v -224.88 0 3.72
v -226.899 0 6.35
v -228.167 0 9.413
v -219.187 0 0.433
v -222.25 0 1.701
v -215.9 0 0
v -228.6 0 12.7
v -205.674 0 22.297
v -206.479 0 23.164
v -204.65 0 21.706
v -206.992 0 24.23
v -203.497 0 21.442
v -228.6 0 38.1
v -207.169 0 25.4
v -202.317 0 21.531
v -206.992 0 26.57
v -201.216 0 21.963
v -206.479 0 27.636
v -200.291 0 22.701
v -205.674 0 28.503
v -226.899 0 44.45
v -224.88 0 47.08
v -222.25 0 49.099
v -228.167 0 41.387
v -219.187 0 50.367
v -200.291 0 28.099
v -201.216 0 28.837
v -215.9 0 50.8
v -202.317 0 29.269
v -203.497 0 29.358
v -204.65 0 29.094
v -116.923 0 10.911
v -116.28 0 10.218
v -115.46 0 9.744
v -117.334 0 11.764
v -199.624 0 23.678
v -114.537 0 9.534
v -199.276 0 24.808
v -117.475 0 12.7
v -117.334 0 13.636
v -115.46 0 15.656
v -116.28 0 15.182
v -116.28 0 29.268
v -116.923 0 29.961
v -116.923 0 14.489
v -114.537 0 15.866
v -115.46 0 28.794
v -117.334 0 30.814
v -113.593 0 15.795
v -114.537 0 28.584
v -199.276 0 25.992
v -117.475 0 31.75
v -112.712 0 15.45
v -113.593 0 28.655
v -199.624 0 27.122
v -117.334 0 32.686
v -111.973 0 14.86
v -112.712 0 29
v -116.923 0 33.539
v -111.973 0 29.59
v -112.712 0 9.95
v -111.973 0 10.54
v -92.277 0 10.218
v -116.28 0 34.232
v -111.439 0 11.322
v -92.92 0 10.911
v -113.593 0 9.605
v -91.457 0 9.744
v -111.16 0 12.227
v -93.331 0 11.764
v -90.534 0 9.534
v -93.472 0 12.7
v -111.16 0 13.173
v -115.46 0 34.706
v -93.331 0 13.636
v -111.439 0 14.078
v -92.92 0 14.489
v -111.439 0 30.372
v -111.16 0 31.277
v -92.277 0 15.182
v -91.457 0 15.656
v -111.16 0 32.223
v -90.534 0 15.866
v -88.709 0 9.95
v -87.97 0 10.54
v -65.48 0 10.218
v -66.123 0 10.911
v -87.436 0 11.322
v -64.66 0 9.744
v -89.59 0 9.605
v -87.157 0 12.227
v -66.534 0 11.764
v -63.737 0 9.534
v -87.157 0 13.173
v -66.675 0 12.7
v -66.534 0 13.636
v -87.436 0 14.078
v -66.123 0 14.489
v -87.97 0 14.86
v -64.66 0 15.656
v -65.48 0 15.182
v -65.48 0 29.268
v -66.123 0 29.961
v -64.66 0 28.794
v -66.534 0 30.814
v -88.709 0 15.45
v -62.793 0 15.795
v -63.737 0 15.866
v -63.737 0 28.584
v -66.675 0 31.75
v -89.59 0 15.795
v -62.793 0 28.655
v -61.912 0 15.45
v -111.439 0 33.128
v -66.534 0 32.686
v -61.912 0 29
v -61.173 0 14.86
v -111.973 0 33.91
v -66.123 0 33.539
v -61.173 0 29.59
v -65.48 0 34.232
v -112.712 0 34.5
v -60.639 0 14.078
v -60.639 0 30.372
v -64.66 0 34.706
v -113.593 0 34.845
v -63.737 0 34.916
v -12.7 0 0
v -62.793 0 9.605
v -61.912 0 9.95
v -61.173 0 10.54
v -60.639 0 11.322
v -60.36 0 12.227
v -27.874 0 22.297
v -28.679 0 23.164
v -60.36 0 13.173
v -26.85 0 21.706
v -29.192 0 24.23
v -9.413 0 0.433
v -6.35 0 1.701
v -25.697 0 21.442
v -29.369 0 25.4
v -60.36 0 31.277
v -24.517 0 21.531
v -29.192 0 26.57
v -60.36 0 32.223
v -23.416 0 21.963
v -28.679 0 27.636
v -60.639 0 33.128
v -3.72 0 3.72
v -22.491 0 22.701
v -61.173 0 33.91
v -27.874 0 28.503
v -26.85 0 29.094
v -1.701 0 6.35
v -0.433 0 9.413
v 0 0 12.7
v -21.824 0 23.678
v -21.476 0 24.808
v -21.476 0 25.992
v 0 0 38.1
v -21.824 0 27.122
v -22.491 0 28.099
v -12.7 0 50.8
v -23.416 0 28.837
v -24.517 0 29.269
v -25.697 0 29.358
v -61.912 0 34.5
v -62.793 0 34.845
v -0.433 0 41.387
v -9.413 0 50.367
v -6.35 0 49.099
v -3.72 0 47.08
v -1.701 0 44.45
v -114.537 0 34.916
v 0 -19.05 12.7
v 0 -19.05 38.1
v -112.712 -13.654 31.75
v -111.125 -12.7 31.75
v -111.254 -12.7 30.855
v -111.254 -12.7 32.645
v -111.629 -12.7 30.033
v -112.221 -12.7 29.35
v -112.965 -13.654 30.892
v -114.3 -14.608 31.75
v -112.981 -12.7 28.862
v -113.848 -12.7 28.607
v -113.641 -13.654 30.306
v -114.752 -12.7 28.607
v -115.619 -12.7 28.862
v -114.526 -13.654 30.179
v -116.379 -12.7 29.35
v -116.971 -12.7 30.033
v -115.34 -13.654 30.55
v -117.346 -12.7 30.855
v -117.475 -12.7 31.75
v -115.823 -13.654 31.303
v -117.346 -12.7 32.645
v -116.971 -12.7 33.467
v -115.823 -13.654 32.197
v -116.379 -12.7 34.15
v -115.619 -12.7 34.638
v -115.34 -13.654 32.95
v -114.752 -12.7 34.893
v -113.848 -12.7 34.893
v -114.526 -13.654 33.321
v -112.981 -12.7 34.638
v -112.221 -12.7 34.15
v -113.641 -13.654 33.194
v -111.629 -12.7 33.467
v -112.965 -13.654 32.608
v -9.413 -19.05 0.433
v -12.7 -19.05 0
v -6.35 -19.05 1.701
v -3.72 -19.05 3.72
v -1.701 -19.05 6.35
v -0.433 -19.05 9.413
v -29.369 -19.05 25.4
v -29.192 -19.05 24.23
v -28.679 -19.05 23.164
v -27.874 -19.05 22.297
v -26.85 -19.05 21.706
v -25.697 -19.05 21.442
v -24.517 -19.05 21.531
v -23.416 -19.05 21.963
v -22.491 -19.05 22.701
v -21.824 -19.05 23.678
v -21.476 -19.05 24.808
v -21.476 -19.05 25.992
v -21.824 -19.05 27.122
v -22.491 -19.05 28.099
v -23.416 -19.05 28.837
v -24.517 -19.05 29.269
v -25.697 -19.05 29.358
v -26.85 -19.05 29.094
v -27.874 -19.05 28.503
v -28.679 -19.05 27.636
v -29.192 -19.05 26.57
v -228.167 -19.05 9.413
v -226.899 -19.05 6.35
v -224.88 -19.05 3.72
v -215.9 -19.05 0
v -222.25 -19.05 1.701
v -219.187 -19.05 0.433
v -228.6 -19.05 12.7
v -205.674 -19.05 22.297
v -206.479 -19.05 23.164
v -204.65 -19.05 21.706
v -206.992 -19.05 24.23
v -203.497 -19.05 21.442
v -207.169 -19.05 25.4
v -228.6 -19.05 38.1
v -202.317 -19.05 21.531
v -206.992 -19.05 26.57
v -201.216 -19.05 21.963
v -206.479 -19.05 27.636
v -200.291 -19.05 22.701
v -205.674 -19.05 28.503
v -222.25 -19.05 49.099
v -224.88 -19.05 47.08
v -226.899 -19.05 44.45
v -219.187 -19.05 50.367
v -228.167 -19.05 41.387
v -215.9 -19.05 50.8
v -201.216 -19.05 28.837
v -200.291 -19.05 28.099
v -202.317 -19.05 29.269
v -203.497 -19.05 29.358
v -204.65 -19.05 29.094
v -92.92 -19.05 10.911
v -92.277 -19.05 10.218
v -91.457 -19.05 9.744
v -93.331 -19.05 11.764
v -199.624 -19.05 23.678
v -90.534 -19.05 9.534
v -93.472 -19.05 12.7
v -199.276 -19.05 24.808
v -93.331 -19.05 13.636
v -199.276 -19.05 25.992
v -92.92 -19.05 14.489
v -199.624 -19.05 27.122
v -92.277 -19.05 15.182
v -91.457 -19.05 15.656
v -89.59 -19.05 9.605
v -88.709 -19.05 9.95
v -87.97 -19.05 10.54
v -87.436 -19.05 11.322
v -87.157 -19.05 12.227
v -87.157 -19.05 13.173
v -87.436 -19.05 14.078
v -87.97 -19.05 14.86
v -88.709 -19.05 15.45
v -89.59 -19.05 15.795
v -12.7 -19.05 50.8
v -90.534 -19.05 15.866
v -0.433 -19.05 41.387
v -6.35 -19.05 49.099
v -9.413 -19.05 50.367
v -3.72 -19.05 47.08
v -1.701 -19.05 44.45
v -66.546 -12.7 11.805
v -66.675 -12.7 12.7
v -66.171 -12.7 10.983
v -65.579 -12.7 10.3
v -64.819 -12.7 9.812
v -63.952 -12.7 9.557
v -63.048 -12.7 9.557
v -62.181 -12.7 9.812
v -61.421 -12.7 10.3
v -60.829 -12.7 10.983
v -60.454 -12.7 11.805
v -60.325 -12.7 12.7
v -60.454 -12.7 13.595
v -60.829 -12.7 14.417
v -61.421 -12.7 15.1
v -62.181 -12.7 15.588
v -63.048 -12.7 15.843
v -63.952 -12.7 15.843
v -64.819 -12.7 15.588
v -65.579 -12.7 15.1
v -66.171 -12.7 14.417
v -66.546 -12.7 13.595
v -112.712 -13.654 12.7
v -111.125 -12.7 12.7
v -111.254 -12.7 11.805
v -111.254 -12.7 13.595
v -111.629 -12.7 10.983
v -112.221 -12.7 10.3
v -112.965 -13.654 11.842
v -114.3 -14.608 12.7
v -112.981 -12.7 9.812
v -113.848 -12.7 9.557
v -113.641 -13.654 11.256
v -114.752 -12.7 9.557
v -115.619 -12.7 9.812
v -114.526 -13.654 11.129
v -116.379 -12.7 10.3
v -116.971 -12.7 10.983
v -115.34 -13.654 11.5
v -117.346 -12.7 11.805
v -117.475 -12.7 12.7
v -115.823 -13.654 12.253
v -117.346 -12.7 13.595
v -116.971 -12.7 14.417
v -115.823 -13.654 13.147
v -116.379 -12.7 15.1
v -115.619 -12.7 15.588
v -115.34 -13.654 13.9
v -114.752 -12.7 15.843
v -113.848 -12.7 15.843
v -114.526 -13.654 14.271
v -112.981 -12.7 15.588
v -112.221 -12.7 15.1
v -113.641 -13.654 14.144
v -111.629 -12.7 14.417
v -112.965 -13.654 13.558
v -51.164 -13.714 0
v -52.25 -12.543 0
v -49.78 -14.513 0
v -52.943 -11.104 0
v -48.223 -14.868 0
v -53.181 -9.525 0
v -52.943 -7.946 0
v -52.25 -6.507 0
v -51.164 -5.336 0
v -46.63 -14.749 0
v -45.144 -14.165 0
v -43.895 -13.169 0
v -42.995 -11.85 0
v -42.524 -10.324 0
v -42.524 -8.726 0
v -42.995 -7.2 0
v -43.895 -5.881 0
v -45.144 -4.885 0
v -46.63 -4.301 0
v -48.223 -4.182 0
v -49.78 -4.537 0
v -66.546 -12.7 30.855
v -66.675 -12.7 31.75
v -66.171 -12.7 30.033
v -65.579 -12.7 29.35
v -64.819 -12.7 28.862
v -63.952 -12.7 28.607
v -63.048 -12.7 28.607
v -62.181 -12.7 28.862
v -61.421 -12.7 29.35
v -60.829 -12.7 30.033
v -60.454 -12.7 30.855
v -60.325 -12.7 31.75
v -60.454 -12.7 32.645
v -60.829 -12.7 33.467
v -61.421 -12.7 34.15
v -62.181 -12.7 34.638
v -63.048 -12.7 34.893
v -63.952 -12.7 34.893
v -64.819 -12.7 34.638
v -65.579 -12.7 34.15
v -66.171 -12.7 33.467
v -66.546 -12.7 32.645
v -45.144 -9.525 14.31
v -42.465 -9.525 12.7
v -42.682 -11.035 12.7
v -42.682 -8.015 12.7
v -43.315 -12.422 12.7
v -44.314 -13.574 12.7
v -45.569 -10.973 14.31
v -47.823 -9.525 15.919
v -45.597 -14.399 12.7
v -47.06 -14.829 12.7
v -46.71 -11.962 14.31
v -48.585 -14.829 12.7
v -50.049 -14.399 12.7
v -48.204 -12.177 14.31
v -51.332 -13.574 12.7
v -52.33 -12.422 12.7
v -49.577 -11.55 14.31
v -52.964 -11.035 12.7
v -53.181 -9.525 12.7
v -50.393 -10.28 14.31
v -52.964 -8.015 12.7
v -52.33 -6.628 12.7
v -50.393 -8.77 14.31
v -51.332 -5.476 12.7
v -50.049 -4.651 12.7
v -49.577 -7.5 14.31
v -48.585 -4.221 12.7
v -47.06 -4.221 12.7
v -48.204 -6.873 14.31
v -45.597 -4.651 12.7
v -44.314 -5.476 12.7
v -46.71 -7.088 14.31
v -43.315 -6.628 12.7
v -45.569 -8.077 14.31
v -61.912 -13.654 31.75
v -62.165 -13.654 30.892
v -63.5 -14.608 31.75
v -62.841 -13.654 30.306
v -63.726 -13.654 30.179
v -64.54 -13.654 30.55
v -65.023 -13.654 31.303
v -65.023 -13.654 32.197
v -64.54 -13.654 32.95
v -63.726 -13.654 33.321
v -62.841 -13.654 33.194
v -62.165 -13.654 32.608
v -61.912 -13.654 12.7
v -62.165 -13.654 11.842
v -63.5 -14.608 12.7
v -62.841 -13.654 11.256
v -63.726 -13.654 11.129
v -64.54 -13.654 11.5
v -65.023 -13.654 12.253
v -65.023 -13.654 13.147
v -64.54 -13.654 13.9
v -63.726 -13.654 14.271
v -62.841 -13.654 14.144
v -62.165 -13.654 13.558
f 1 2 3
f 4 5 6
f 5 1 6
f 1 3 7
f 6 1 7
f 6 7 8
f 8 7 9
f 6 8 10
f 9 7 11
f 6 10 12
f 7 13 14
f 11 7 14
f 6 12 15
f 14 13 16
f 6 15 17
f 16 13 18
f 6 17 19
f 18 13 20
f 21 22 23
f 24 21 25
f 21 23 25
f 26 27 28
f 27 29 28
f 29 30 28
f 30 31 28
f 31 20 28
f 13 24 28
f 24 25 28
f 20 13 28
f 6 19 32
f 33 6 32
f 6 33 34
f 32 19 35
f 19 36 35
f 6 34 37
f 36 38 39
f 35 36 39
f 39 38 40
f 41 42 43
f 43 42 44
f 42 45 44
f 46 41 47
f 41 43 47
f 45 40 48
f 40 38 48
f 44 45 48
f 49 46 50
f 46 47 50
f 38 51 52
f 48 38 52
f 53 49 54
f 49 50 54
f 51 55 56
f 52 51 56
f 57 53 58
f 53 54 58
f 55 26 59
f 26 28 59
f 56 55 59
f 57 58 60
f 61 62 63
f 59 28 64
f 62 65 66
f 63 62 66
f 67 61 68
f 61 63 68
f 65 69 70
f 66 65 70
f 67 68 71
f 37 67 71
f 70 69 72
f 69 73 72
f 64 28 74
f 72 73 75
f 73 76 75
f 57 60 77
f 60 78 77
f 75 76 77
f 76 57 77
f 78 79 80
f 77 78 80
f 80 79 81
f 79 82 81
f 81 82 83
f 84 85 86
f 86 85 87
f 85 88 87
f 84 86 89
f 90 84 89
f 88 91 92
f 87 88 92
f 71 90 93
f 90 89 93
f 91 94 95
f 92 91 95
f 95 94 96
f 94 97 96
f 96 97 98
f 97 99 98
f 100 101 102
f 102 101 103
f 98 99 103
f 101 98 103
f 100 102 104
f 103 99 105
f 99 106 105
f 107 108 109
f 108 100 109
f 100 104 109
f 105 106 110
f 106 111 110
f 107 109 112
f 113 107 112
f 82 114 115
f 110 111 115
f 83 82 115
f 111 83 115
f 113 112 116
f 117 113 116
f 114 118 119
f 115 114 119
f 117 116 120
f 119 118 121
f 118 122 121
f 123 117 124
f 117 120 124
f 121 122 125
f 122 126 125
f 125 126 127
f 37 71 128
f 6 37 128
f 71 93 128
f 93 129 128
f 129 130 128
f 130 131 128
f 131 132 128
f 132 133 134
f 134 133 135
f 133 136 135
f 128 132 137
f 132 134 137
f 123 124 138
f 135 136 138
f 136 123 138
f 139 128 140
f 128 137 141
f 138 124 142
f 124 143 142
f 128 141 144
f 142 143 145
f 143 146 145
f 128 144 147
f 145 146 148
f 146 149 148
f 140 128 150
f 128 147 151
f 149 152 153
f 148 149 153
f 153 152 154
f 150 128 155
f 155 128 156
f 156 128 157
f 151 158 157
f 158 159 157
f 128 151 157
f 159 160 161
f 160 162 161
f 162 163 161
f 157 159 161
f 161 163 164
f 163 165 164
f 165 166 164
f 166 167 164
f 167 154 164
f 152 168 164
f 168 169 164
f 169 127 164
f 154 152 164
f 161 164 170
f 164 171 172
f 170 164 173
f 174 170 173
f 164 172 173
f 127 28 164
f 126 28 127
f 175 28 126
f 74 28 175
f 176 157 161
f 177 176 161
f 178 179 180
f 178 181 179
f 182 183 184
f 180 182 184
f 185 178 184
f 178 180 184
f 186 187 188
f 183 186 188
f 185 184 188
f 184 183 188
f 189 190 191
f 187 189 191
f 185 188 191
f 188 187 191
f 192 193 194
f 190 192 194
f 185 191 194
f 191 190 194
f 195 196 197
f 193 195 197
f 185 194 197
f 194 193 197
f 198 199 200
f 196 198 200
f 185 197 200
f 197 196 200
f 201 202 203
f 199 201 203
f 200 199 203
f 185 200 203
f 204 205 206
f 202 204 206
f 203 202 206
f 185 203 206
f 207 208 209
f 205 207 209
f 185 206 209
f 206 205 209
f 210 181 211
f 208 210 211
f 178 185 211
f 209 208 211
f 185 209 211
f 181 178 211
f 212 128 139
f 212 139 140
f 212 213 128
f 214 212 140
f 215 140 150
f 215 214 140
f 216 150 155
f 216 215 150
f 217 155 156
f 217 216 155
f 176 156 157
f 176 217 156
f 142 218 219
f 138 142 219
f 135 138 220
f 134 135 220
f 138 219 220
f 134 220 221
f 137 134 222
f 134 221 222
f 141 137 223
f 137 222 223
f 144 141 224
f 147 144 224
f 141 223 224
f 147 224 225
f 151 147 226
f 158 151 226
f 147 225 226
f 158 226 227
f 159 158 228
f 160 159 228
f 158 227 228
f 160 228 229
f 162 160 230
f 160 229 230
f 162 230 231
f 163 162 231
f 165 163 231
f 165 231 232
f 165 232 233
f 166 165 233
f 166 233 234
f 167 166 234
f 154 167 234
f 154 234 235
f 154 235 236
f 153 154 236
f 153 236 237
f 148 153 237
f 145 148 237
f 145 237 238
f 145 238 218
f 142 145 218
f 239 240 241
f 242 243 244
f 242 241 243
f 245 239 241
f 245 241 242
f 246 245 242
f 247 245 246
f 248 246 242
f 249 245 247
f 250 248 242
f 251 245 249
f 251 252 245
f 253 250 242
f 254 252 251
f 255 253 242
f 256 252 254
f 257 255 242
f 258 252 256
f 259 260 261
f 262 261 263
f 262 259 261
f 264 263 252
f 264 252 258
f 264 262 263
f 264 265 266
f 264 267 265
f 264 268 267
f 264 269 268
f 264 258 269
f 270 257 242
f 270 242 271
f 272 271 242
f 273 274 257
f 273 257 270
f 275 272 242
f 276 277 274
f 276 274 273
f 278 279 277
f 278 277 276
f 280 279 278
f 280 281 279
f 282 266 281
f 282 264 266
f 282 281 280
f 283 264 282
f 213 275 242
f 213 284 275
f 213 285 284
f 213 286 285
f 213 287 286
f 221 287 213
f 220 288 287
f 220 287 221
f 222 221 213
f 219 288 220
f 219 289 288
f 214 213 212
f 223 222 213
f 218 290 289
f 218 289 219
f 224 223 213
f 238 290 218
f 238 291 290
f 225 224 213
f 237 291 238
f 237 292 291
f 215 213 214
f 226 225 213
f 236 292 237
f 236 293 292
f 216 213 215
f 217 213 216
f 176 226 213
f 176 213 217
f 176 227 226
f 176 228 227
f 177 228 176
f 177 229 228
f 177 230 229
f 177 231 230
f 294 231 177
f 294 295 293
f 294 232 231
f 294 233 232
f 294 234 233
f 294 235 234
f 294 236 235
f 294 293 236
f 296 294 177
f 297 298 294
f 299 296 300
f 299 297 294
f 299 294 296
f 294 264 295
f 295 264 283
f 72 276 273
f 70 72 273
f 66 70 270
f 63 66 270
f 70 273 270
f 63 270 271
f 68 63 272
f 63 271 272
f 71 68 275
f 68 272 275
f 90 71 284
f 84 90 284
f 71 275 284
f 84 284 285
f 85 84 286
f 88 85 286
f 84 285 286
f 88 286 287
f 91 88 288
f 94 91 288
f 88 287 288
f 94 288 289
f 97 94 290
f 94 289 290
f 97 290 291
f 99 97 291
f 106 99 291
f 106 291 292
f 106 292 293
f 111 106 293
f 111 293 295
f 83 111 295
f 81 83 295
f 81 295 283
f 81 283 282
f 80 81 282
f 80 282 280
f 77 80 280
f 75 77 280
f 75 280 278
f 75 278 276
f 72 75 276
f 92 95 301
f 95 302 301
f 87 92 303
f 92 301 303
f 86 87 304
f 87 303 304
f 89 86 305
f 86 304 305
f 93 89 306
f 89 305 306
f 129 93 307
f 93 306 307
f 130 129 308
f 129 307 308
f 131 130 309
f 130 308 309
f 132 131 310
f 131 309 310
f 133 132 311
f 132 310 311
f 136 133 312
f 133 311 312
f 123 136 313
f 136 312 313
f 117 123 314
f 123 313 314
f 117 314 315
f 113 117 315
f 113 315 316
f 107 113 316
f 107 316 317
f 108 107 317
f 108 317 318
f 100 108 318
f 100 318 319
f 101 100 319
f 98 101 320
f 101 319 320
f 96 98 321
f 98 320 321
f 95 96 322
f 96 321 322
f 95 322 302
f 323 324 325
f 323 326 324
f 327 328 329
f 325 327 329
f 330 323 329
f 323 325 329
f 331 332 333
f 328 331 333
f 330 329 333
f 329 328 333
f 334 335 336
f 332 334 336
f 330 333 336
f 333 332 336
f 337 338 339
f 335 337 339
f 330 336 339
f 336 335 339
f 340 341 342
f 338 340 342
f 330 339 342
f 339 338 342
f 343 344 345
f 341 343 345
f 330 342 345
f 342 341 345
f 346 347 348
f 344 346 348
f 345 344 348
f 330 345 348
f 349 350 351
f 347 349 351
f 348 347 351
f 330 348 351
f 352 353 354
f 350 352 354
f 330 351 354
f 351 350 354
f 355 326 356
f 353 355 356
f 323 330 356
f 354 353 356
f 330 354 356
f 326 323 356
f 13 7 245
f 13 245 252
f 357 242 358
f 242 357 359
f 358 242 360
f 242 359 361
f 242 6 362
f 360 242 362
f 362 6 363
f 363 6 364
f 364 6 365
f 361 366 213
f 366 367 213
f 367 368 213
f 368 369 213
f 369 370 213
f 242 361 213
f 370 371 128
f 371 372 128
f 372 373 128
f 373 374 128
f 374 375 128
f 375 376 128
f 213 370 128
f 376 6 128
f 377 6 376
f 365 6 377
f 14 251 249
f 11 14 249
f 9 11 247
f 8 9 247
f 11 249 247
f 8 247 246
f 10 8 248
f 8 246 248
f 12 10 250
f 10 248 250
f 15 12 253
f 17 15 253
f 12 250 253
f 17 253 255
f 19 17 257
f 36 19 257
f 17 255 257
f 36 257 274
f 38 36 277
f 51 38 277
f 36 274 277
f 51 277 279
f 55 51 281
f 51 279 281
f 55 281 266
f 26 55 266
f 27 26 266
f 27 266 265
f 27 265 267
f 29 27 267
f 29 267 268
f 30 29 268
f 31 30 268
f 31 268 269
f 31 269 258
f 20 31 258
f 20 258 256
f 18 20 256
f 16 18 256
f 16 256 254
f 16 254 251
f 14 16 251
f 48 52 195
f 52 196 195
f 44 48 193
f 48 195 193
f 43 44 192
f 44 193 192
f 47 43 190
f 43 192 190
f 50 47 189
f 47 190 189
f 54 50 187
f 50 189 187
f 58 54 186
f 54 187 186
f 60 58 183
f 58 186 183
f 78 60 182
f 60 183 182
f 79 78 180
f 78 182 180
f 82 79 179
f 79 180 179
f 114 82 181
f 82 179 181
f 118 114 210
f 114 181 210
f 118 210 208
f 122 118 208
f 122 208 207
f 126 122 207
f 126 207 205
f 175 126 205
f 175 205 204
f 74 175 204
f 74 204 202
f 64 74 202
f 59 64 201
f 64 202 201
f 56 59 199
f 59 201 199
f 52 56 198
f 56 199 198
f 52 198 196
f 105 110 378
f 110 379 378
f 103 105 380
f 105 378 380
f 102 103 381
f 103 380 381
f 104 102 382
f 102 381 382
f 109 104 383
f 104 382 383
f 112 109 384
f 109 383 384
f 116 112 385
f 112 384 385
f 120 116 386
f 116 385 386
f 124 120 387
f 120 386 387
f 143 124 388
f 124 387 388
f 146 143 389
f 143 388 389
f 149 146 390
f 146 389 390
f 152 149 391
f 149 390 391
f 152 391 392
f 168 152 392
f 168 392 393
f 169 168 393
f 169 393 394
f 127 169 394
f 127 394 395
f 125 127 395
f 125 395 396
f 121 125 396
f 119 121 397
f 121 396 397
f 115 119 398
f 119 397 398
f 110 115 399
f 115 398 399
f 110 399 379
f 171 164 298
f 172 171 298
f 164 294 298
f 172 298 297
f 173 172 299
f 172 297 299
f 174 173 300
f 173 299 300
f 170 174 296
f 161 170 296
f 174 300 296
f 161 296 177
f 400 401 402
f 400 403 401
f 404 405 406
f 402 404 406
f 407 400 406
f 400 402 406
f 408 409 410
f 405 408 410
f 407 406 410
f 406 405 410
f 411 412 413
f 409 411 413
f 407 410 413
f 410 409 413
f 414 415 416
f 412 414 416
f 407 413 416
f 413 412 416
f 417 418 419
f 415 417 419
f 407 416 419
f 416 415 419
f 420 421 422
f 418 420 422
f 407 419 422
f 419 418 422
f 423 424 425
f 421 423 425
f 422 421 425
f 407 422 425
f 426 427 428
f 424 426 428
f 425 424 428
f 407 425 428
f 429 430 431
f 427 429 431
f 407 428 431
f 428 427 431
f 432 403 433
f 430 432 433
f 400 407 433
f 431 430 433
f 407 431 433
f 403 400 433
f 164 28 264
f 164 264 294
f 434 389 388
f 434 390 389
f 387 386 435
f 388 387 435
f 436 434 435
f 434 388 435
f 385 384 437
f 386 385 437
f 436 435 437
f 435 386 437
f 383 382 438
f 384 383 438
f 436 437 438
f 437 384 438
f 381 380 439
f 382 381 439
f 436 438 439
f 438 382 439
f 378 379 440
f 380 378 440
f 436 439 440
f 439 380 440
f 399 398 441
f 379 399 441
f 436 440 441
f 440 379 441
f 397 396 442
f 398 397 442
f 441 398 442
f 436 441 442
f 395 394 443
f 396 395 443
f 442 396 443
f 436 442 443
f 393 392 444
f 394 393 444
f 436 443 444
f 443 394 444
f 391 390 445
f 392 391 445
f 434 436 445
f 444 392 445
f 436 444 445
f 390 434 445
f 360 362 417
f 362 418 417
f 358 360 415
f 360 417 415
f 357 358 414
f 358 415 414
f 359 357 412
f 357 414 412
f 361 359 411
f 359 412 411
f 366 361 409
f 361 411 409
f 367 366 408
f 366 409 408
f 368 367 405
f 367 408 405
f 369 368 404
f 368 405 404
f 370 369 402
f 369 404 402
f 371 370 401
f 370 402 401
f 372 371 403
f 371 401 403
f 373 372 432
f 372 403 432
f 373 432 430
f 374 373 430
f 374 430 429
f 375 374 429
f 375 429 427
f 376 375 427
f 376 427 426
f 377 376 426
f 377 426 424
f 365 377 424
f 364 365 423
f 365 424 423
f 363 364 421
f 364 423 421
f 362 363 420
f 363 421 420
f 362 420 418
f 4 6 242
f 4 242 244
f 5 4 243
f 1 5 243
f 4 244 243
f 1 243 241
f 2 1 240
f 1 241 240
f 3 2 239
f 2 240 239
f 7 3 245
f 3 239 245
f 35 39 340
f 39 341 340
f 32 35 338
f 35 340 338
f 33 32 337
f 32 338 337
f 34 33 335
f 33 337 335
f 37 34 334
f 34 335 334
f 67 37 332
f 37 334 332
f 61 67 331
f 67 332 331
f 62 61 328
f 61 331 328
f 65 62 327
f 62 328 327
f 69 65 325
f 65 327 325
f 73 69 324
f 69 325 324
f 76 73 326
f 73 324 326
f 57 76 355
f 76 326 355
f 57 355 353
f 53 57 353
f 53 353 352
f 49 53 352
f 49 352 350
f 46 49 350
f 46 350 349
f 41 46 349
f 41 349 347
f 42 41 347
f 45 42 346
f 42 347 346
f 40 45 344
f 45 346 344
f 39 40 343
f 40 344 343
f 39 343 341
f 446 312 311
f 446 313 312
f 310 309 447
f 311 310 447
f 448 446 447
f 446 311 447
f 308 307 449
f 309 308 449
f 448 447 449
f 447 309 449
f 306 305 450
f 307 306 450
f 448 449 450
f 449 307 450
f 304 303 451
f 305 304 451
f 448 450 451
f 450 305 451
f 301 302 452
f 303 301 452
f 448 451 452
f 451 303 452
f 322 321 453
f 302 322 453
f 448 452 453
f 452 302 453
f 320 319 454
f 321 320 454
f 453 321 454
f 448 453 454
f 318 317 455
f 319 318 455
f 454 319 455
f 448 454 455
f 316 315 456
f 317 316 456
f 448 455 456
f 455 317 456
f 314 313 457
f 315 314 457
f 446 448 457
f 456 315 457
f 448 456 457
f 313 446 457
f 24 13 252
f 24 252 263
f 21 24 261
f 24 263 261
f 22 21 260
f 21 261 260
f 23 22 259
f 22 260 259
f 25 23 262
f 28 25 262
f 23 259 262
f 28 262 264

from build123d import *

# Parameters (mm, degrees)
F0_W      = 228.6
F0_H      = 50.8
F1_DEPTH  = 19.05
F2_D      = 7.9375
F3_R      = 12.7
F4_D      = 6.35
F4_DEPTH  = 12.7
F4_TIP    = 1.9077324654
F9_D      = 6.35
F10_R     = 12.7
F12_D     = 10.71626
F12_DEPTH = 12.7
F12_TIP   = 3.2194893086


with BuildPart() as f1:
    # F0 (on Front) → F1 (new body)
    with BuildSketch(Plane.XZ):
        with Locations((-114.3, 25.4)):
            Rectangle(F0_W, F0_H)
    extrude(amount=F1_DEPTH)

    # F2 (through all)
    with Locations(Plane(origin=(0, 0, 0), x_dir=(1, 0, 0), z_dir=(0, 1, 0))):
        with Locations((-203.2, -25.4), (-25.4, -25.4)):
            Hole(F2_D / 2)

    # F3
    f3_edges = [f1.edges().sort_by_distance(p)[0] for p in [
        (0, -9.525, 0),
        (0, -9.525, 50.8),
    ]]
    fillet(f3_edges, radius=F3_R)

    # F4
    with Locations(Plane(origin=(0, 0, 0), x_dir=(1, 0, 0), z_dir=(0, 1, 0))):
        with Locations((-114.3, -31.75), (-114.3, -12.7), (-63.5, -12.7), (-63.5, -31.75)):
            Hole(F4_D / 2, depth=F4_DEPTH)
            with Locations((0, 0, -(F4_DEPTH + F4_TIP / 2))):  # 118° drill point
                Cone(0, F4_D / 2, F4_TIP, mode=Mode.SUBTRACT)


with BuildPart() as f5_1:
    # F5: instance of F1
    add(f1.part.mirror(Plane(origin=(-114.9742152146, -19.05, 25.4), x_dir=(1, 0, 0), z_dir=(0, -1, 0))))


with BuildPart() as f7_1:
    # F7: instance of F5_1
    add(f5_1.part.mirror(Plane(origin=(-114.9742152146, -19.05, 25.4), x_dir=(-1, 0, 0), z_dir=(0, 1, 0))))

    # F9 (through all)
    with Locations(Plane(origin=(0, 0, 0), x_dir=(1, 0, 0), z_dir=(0, 1, 0))):
        with Locations((-90.297, -12.7)):
            Hole(F9_D / 2)

    # F10
    f10_edges = [f7_1.edges().sort_by_distance(p)[0] for p in [
        (-228.6, -9.525, 50.8),
        (-228.6, -9.525, 0),
    ]]
    fillet(f10_edges, radius=F10_R)

    # F12
    with Locations(Plane(origin=(0, 0, 0), x_dir=(1, 0, 0), z_dir=(0, 0, -1))):
        with Locations((-47.8227784872, 9.525)):
            Hole(F12_D / 2, depth=F12_DEPTH)
            with Locations((0, 0, -(F12_DEPTH + F12_TIP / 2))):  # 118° drill point
                Cone(0, F12_D / 2, F12_TIP, mode=Mode.SUBTRACT)


solid = f7_1.part
